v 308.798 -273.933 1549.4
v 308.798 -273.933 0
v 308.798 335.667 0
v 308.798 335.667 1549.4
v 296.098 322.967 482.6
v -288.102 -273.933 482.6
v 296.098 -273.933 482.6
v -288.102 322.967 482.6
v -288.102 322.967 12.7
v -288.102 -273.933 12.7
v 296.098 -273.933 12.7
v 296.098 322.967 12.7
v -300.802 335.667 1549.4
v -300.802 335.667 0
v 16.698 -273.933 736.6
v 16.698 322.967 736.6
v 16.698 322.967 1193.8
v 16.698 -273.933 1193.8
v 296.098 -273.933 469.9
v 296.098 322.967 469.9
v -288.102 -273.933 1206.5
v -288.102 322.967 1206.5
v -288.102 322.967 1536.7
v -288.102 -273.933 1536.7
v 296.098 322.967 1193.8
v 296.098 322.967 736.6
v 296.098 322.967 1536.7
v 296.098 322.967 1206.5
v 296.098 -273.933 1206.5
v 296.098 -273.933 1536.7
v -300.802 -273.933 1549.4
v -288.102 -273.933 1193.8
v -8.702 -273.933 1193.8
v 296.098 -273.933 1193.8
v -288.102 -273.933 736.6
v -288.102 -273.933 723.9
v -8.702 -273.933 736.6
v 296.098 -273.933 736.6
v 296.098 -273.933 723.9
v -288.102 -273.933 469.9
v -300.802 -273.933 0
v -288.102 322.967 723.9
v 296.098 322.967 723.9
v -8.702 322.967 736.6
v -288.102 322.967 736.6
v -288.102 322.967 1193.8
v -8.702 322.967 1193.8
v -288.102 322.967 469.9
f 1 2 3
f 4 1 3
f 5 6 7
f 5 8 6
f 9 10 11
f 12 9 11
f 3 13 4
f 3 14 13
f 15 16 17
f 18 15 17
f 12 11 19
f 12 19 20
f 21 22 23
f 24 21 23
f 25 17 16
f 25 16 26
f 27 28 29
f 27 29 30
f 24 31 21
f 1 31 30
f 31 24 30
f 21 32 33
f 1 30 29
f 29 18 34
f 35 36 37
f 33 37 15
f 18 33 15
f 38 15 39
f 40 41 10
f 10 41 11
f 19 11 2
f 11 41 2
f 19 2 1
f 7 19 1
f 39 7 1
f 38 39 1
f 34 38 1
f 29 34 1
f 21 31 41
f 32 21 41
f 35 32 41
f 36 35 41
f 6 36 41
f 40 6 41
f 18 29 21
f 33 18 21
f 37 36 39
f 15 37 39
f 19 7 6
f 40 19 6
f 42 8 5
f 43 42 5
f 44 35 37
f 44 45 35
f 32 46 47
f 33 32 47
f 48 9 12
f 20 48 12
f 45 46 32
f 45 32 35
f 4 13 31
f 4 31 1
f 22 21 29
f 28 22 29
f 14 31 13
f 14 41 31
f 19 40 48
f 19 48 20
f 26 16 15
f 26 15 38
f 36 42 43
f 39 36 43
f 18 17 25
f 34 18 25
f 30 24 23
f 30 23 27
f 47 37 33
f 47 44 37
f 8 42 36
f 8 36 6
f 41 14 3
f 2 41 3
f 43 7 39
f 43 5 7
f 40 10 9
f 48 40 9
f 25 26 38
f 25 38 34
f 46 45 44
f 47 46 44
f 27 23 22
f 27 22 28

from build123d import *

# Parameters (mm, degrees)
F0_W      = 609.6
F0_H      = 609.6
F1_DEPTH  = 482.6
F2_T      = -12.7
F3_DEPTH  = 254
F4_T      = -12.7
F5_W      = 304.8
F5_H      = 609.6
F6_DEPTH  = 469.9
F7_T      = -12.7
F8_DEPTH  = 469.9
F9_DEPTH  = 342.9
F10_W     = 279.4
F10_H     = 457.2
F11_DEPTH = 596.9
F12_W     = 584.2
F12_H     = 330.2
F13_DEPTH = 596.9
F14_W     = 609.6
F14_H     = 1549.4
F15_DEPTH = 12.7


# Not quite as in the source:
# - a shell that OpenCascade refuses in one call is made with other operations: the cavity is built on its own and cut out


with BuildPart() as f1:
    # F0 (on Top) → F1 (new body)
    with BuildSketch(Plane.XY):
        with Locations((3.9980113506, 30.8666436833)):
            Rectangle(F0_W, F0_H)
    extrude(amount=F1_DEPTH)

    # F2
    f2_openings = [f1.faces().sort_by_distance(p)[0] for p in [
        (3.998011, -273.933356, 241.3),
    ]]
    offset(amount=F2_T, openings=f2_openings)

    # F3 (add): a face of the model
    f3_faces = [f1.faces().sort_by_distance(p)[0] for p in [
        (3.9980113506, 30.8666436833, 482.6),
    ]]
    extrude(f3_faces, amount=F3_DEPTH)

    # F4: a shell. OpenCascade refuses it in one call, so the cavity is built on its own and cut out:
    # the body offset inwards by the wall thickness, plus a prism from it out through each open face.
    f4_core = offset(f1.part, amount=F4_T, kind=Kind.INTERSECTION, mode=Mode.PRIVATE)
    f4_exits = [f4_core.faces().sort_by_distance(p)[0] for p in [
        (3.998011, -261.233356, 603.25),
    ]]
    add(f4_core, mode=Mode.SUBTRACT)
    extrude(f4_exits, amount=-F4_T, mode=Mode.SUBTRACT)

    # F5 (on face) → F6 (join)
    with BuildSketch(Plane.XY.offset(736.6)):
        with Locations((-148.4019886494, 30.8666436833)):
            Rectangle(F5_W, F5_H)
    extrude(amount=F6_DEPTH)

    # F7: a shell. OpenCascade refuses it in one call, so the cavity is built on its own and cut out:
    # the body offset inwards by the wall thickness, plus a prism from it out through each open face.
    f7_core = offset(f1.part, amount=F7_T, kind=Kind.INTERSECTION, mode=Mode.PRIVATE)
    f7_exits = [f7_core.faces().sort_by_distance(p)[0] for p in [
        (-148.401989, -261.233356, 965.2),
    ]]
    add(f7_core, mode=Mode.SUBTRACT)
    extrude(f7_exits, amount=-F7_T, mode=Mode.SUBTRACT)

    # F8 (add): a face of the model
    f8_faces = [f1.faces().sort_by_distance(p)[0] for p in [
        (156.3980113506, 30.8666436833, 736.6),
    ]]
    extrude(f8_faces, amount=F8_DEPTH)

    # F9 (add): a face of the model
    f9_faces = [f1.faces().sort_by_distance(p)[0] for p in [
        (3.9980113506, 30.8666436833, 1206.5),
    ]]
    extrude(f9_faces, amount=F9_DEPTH)

    # F10 (on face) → F11 (cut)
    with BuildSketch(Plane.XZ.offset(273.9333563167)):
        with Locations((156.3980113506, 965.2)):
            Rectangle(F10_W, F10_H)
    extrude(amount=-F11_DEPTH, mode=Mode.SUBTRACT)

    # F12 (on face) → F13 (cut)
    with BuildSketch(Plane.XZ.offset(273.9333563167)):
        with Locations((3.9980113506, 1371.6)):
            Rectangle(F12_W, F12_H)
    extrude(amount=-F13_DEPTH, mode=Mode.SUBTRACT)


with BuildPart() as f15:
    # F14 (on face) → F15 (new body)
    with BuildSketch(Plane.XZ.offset(273.9333563167)):
        with Locations((3.9980113506, 774.7)):
            Rectangle(F14_W, F14_H)
    extrude(amount=F15_DEPTH)


solid = f1.part
